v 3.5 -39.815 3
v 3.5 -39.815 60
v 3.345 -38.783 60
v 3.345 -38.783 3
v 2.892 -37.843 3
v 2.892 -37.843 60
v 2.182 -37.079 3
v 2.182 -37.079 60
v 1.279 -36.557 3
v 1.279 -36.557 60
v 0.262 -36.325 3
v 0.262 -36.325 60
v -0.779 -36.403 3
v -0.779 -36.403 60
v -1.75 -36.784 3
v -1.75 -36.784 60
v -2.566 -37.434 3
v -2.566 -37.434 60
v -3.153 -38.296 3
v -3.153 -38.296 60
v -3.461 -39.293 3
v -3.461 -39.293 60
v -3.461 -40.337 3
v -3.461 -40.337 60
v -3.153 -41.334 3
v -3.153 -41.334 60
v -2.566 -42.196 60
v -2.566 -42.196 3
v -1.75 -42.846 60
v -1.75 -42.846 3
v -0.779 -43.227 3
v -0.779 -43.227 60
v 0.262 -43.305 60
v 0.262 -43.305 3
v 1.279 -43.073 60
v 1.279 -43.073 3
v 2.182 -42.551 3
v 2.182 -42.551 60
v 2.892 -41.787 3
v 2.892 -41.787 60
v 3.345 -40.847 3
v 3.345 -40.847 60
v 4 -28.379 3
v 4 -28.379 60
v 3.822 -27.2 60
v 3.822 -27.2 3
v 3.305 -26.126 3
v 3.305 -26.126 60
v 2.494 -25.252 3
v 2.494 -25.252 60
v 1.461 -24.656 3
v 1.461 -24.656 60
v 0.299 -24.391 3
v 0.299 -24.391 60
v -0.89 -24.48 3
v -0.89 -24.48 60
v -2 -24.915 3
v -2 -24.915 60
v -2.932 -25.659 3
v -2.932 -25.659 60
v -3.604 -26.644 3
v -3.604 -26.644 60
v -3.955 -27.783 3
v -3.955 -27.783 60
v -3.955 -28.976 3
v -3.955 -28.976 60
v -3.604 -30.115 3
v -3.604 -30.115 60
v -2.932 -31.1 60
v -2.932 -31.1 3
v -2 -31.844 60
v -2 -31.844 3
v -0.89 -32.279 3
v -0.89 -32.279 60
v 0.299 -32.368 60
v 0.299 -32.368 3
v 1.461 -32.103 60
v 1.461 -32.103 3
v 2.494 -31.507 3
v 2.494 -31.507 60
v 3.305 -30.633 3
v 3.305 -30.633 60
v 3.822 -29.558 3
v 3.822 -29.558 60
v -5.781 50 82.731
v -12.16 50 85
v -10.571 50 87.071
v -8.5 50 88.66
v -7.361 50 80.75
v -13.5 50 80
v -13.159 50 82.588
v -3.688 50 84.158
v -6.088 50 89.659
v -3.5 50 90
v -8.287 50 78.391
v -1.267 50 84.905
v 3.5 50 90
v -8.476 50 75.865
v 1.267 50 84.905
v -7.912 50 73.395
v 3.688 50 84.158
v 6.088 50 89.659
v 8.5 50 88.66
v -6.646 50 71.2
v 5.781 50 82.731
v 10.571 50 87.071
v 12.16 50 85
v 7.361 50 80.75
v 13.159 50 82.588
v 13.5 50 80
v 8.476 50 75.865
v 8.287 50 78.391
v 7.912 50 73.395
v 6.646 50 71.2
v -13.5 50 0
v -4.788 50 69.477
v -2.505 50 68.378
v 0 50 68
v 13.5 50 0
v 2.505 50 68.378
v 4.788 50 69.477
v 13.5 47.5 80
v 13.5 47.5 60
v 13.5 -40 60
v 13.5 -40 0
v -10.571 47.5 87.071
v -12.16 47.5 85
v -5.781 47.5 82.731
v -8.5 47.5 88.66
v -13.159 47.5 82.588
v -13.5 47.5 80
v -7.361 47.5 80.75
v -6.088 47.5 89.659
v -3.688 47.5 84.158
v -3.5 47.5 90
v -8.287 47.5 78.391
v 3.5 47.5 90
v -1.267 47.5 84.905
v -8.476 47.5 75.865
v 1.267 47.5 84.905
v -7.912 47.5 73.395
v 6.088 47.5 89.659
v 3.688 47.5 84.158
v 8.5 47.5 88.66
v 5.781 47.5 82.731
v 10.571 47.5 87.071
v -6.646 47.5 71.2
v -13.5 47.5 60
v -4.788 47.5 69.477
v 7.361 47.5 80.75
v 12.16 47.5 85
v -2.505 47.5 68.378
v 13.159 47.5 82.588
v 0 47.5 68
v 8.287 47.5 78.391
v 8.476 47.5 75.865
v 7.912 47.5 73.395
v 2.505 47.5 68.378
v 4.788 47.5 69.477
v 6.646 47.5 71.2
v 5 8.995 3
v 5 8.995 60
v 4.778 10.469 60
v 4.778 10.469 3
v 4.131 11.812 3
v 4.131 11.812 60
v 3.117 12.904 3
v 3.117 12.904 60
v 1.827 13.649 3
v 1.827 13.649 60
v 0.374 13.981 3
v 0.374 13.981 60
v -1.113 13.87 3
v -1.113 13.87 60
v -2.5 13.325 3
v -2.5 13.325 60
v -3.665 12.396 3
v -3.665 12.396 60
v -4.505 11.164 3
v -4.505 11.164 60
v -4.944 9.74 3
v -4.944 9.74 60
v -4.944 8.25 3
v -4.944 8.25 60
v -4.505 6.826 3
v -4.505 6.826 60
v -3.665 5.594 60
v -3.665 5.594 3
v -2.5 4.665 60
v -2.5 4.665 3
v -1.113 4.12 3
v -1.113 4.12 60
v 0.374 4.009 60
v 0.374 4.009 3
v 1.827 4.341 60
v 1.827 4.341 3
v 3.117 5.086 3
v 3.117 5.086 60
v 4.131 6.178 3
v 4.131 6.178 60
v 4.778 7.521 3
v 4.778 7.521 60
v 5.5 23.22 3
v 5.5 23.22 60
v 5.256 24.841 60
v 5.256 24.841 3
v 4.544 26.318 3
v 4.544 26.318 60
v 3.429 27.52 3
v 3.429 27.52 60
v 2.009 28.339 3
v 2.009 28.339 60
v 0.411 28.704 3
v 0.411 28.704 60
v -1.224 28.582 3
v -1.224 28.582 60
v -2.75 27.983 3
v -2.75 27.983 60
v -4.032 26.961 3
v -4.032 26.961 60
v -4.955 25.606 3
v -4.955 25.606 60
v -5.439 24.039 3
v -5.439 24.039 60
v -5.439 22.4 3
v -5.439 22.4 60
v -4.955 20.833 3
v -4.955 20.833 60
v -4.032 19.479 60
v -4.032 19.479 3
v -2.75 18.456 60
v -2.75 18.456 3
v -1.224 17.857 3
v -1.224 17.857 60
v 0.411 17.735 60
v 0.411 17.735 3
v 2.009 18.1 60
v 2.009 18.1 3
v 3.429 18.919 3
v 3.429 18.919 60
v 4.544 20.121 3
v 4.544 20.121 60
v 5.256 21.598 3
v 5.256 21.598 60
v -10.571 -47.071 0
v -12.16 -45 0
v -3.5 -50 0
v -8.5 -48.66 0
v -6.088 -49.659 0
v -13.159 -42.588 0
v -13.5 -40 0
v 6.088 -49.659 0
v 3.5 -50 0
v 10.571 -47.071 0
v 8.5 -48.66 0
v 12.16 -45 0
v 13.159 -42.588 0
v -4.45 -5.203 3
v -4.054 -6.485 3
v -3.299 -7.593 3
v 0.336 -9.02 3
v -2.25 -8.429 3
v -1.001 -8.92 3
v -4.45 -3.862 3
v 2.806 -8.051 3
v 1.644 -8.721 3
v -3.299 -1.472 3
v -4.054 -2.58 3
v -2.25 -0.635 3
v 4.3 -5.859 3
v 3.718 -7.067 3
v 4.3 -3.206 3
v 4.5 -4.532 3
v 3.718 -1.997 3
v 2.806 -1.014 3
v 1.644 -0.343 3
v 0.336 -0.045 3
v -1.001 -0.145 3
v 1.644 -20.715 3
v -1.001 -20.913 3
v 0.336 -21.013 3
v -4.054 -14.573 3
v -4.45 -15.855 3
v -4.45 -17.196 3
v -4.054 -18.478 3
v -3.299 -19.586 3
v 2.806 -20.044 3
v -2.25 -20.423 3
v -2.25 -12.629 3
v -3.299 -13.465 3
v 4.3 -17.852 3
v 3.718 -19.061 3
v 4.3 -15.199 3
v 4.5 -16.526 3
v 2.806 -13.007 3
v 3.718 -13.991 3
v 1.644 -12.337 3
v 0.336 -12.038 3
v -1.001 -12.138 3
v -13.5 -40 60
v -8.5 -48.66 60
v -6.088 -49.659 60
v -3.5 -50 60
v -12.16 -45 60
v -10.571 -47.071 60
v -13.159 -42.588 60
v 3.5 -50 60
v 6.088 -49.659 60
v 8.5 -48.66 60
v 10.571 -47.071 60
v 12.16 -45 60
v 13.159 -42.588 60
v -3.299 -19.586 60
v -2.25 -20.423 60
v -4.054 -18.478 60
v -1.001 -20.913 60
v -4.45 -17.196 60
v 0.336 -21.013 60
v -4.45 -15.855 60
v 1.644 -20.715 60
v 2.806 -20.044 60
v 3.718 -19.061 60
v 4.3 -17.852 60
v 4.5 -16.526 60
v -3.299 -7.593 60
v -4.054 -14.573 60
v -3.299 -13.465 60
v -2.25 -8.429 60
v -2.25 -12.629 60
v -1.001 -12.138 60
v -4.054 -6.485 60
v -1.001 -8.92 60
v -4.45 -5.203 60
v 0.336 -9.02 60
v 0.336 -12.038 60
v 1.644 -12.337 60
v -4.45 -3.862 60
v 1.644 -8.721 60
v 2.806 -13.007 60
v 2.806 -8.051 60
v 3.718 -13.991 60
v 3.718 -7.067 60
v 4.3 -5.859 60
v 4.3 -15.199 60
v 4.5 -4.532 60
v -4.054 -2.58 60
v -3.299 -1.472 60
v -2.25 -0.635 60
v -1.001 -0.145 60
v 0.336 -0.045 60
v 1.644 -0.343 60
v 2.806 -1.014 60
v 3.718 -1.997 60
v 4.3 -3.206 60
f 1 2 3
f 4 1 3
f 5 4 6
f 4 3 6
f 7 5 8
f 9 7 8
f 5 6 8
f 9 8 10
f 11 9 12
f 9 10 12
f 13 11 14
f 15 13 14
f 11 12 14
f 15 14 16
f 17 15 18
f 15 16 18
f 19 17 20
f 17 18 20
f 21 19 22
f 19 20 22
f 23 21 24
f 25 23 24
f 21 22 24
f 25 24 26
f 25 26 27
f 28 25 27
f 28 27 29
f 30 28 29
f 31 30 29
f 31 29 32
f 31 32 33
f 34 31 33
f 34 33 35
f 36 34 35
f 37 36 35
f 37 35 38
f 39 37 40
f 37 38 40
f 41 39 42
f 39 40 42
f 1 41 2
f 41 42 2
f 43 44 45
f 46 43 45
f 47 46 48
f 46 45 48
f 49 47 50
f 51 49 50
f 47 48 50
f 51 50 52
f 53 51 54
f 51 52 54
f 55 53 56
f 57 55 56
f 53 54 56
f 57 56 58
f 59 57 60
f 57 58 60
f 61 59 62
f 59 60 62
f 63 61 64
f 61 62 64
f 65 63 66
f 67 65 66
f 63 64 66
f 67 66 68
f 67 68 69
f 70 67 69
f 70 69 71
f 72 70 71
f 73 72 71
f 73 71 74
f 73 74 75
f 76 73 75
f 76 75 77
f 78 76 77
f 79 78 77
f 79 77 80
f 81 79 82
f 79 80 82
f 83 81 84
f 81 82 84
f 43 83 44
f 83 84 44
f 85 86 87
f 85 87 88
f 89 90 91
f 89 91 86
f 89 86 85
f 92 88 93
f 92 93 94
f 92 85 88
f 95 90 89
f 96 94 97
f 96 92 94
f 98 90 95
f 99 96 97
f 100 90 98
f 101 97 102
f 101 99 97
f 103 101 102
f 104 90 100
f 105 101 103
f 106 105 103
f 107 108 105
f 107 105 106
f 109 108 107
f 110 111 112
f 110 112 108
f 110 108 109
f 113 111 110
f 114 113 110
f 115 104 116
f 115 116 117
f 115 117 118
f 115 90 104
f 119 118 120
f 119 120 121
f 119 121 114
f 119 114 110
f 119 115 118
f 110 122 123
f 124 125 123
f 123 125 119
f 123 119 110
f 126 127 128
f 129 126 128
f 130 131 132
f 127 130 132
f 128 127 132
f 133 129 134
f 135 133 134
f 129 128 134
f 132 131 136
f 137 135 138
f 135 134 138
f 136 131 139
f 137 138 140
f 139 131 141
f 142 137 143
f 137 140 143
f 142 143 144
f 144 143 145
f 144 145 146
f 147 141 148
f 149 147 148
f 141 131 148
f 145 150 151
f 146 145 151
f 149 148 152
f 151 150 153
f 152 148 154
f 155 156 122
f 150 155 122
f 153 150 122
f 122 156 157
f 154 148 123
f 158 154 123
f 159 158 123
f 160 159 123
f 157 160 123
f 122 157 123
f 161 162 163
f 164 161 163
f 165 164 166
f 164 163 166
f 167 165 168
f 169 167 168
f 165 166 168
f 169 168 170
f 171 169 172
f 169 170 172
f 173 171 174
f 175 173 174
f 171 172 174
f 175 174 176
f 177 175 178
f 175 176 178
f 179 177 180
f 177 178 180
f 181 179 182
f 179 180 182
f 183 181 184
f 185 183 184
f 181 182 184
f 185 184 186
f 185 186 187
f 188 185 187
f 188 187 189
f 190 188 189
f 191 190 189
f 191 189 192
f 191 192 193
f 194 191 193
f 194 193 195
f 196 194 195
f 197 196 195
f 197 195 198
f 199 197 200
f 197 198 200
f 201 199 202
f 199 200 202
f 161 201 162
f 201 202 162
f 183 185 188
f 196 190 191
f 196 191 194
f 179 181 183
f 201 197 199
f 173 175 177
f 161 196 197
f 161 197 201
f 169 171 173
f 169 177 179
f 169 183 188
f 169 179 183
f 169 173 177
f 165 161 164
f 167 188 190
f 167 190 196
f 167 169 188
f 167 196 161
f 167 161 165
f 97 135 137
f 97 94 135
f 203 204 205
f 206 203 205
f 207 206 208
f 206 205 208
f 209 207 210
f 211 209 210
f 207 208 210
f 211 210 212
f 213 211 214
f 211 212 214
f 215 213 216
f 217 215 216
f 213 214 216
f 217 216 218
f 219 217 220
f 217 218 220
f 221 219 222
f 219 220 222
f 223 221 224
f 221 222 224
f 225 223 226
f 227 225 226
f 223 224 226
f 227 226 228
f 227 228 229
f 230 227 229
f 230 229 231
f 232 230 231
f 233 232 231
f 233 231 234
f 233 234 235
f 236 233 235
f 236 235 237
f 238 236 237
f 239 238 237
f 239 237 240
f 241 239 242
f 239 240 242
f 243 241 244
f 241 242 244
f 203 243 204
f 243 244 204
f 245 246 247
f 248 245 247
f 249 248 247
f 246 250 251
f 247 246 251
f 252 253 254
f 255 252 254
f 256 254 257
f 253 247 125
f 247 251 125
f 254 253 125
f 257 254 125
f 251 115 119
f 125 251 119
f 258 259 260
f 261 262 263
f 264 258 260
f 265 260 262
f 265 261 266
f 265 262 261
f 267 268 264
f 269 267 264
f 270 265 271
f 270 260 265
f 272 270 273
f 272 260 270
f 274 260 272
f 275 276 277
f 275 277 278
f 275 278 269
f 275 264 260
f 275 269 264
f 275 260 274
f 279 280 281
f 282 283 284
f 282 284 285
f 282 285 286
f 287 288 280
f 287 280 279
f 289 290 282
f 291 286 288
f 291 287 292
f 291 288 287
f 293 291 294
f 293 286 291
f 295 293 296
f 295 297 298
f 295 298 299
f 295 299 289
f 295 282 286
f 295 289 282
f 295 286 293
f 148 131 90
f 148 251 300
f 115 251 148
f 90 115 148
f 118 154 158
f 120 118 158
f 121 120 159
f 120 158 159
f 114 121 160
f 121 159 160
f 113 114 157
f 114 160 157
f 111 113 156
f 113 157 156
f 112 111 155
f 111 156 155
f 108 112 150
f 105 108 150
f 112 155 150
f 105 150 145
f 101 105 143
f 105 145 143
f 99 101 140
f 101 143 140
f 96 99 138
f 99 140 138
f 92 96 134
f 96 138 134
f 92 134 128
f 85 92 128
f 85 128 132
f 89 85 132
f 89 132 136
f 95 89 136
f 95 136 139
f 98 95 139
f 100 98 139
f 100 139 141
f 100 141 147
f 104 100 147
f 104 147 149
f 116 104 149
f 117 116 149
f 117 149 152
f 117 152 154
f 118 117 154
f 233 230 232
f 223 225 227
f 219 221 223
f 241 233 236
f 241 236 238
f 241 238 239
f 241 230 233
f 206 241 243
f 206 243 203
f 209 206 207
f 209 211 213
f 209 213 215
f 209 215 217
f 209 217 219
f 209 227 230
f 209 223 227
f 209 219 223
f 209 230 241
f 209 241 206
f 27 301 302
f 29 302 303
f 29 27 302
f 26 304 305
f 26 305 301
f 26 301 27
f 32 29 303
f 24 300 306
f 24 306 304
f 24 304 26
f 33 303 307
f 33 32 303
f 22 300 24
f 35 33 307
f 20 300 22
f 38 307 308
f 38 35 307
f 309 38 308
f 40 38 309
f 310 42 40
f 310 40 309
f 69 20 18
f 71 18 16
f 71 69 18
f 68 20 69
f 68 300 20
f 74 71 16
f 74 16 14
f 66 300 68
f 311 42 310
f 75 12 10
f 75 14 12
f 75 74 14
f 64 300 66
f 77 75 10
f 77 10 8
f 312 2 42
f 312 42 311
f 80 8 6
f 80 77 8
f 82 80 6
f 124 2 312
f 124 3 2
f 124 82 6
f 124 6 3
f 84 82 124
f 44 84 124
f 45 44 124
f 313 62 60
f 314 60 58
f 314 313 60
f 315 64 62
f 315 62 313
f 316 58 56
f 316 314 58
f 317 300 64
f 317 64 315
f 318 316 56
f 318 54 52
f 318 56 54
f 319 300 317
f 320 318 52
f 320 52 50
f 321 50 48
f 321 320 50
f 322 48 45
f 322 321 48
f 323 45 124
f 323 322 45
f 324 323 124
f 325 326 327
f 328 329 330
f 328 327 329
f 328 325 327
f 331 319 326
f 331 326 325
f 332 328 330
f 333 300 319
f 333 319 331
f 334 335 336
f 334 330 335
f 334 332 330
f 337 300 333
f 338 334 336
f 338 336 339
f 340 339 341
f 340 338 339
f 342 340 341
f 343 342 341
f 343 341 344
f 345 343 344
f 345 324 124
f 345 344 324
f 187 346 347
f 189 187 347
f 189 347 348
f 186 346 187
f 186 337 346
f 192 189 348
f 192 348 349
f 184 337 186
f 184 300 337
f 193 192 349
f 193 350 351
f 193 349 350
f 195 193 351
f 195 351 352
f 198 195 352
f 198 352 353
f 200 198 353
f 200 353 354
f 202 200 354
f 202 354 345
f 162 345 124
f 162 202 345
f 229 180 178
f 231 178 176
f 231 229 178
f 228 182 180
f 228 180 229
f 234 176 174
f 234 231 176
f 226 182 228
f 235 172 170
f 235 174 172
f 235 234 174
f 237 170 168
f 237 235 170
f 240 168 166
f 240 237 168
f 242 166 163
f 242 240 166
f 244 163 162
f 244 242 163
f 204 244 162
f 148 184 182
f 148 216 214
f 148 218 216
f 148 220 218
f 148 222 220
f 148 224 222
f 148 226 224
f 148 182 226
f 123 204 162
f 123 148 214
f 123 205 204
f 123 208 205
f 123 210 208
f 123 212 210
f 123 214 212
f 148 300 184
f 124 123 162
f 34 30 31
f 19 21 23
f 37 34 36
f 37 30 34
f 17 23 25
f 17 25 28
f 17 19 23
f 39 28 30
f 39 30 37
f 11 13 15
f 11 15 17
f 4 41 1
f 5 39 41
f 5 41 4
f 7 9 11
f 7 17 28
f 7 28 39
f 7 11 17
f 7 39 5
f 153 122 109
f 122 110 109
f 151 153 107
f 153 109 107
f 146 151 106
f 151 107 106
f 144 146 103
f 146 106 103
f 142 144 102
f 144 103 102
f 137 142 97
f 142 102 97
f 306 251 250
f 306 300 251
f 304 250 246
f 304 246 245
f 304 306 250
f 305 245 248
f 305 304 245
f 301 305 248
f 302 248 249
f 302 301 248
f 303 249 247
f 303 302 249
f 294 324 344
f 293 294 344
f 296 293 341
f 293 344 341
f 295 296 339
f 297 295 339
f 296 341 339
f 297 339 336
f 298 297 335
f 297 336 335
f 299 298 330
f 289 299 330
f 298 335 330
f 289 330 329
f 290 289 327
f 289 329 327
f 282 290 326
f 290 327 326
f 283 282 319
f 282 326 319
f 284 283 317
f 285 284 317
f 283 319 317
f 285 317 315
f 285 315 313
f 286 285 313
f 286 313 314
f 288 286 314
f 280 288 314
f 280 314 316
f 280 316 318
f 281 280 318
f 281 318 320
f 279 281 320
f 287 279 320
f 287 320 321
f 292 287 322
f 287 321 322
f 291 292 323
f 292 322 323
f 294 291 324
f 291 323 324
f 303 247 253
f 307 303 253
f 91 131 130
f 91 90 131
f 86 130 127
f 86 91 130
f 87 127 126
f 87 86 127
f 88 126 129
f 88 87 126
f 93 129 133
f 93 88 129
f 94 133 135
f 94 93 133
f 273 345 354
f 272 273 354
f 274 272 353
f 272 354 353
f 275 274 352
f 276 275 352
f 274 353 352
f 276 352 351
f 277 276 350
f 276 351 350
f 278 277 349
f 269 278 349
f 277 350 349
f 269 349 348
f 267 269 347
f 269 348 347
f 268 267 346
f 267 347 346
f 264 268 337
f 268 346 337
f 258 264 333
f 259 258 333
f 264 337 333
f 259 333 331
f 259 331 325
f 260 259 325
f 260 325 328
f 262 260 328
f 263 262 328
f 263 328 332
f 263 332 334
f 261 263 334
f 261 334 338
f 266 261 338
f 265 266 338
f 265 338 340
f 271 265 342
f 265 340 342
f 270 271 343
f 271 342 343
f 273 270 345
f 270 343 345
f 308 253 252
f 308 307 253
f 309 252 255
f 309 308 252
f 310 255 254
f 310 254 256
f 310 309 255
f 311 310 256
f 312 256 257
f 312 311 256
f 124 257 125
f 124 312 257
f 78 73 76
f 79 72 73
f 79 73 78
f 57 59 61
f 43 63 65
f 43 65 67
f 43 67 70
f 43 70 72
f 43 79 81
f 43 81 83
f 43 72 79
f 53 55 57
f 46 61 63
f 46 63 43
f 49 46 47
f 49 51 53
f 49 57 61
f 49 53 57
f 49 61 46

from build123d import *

# Parameters (mm, degrees)
SKETCH1_W           = 27
SKETCH1_H           = 100
BOSS_EXTRUDE1_DEPTH = 60
FILLET1_R           = 10
SKETCH2_W           = 27
SKETCH2_H           = 2.5
BOSS_EXTRUDE2_DEPTH = 30
FILLET2_R           = 10
SKETCH3_R           = 8.5
CUT_EXTRUDE1_DEPTH  = 134.373535606
SKETCH4_R           = 5.5
SKETCH4_R_2         = 5
SKETCH4_R_3         = 4.5
SKETCH4_R_4         = 4
SKETCH4_R_5         = 3.5
CUT_EXTRUDE2_DEPTH  = 57


with BuildPart() as part:
    # Sketch1 → Boss-Extrude1 (new body)
    with BuildSketch(Plane.XY):
        Rectangle(SKETCH1_W, SKETCH1_H)
    extrude(amount=BOSS_EXTRUDE1_DEPTH)

    # Fillet1
    fillet1_edges = [part.edges().sort_by_distance(p)[0] for p in [
        (13.5, -50, 30),
        (-13.5, -50, 30),
    ]]
    fillet(fillet1_edges, radius=FILLET1_R)

    # Sketch2 → Boss-Extrude2 (add)
    with BuildSketch(Plane.XY.offset(60)):
        with Locations((0, 48.75)):
            Rectangle(SKETCH2_W, SKETCH2_H)
    extrude(amount=BOSS_EXTRUDE2_DEPTH)

    # Fillet2
    fillet2_edges = [part.edges().sort_by_distance(p)[0] for p in [
        (-13.5, 48.75, 90),
        (13.5, 48.75, 90),
    ]]
    fillet(fillet2_edges, radius=FILLET2_R)

    # Sketch3 → Cut-Extrude1 (cut, through all)
    with BuildSketch(Plane.XZ.offset(-47.5)):
        with Locations(Location((0, 76.5, 0), (0, 0, 270))):
            Circle(SKETCH3_R)
    extrude(amount=-CUT_EXTRUDE1_DEPTH, mode=Mode.SUBTRACT)

    # Sketch4 → Cut-Extrude2 (cut)
    with BuildSketch(Plane.XY.offset(60)):
        with Locations((0, 23.219556201)):
            Circle(SKETCH4_R)
        with Locations((0, 8.994963213)):
            Circle(SKETCH4_R_2)
        with Locations((0, -4.532345805)):
            Circle(SKETCH4_R_3)
        with Locations((0, -16.525630089)):
            Circle(SKETCH4_R_3)
        with Locations((0, -28.379457578)):
            Circle(SKETCH4_R_4)
        with Locations((0, -39.814914686)):
            Circle(SKETCH4_R_5)
    extrude(amount=-CUT_EXTRUDE2_DEPTH, mode=Mode.SUBTRACT)


solid = part.part
